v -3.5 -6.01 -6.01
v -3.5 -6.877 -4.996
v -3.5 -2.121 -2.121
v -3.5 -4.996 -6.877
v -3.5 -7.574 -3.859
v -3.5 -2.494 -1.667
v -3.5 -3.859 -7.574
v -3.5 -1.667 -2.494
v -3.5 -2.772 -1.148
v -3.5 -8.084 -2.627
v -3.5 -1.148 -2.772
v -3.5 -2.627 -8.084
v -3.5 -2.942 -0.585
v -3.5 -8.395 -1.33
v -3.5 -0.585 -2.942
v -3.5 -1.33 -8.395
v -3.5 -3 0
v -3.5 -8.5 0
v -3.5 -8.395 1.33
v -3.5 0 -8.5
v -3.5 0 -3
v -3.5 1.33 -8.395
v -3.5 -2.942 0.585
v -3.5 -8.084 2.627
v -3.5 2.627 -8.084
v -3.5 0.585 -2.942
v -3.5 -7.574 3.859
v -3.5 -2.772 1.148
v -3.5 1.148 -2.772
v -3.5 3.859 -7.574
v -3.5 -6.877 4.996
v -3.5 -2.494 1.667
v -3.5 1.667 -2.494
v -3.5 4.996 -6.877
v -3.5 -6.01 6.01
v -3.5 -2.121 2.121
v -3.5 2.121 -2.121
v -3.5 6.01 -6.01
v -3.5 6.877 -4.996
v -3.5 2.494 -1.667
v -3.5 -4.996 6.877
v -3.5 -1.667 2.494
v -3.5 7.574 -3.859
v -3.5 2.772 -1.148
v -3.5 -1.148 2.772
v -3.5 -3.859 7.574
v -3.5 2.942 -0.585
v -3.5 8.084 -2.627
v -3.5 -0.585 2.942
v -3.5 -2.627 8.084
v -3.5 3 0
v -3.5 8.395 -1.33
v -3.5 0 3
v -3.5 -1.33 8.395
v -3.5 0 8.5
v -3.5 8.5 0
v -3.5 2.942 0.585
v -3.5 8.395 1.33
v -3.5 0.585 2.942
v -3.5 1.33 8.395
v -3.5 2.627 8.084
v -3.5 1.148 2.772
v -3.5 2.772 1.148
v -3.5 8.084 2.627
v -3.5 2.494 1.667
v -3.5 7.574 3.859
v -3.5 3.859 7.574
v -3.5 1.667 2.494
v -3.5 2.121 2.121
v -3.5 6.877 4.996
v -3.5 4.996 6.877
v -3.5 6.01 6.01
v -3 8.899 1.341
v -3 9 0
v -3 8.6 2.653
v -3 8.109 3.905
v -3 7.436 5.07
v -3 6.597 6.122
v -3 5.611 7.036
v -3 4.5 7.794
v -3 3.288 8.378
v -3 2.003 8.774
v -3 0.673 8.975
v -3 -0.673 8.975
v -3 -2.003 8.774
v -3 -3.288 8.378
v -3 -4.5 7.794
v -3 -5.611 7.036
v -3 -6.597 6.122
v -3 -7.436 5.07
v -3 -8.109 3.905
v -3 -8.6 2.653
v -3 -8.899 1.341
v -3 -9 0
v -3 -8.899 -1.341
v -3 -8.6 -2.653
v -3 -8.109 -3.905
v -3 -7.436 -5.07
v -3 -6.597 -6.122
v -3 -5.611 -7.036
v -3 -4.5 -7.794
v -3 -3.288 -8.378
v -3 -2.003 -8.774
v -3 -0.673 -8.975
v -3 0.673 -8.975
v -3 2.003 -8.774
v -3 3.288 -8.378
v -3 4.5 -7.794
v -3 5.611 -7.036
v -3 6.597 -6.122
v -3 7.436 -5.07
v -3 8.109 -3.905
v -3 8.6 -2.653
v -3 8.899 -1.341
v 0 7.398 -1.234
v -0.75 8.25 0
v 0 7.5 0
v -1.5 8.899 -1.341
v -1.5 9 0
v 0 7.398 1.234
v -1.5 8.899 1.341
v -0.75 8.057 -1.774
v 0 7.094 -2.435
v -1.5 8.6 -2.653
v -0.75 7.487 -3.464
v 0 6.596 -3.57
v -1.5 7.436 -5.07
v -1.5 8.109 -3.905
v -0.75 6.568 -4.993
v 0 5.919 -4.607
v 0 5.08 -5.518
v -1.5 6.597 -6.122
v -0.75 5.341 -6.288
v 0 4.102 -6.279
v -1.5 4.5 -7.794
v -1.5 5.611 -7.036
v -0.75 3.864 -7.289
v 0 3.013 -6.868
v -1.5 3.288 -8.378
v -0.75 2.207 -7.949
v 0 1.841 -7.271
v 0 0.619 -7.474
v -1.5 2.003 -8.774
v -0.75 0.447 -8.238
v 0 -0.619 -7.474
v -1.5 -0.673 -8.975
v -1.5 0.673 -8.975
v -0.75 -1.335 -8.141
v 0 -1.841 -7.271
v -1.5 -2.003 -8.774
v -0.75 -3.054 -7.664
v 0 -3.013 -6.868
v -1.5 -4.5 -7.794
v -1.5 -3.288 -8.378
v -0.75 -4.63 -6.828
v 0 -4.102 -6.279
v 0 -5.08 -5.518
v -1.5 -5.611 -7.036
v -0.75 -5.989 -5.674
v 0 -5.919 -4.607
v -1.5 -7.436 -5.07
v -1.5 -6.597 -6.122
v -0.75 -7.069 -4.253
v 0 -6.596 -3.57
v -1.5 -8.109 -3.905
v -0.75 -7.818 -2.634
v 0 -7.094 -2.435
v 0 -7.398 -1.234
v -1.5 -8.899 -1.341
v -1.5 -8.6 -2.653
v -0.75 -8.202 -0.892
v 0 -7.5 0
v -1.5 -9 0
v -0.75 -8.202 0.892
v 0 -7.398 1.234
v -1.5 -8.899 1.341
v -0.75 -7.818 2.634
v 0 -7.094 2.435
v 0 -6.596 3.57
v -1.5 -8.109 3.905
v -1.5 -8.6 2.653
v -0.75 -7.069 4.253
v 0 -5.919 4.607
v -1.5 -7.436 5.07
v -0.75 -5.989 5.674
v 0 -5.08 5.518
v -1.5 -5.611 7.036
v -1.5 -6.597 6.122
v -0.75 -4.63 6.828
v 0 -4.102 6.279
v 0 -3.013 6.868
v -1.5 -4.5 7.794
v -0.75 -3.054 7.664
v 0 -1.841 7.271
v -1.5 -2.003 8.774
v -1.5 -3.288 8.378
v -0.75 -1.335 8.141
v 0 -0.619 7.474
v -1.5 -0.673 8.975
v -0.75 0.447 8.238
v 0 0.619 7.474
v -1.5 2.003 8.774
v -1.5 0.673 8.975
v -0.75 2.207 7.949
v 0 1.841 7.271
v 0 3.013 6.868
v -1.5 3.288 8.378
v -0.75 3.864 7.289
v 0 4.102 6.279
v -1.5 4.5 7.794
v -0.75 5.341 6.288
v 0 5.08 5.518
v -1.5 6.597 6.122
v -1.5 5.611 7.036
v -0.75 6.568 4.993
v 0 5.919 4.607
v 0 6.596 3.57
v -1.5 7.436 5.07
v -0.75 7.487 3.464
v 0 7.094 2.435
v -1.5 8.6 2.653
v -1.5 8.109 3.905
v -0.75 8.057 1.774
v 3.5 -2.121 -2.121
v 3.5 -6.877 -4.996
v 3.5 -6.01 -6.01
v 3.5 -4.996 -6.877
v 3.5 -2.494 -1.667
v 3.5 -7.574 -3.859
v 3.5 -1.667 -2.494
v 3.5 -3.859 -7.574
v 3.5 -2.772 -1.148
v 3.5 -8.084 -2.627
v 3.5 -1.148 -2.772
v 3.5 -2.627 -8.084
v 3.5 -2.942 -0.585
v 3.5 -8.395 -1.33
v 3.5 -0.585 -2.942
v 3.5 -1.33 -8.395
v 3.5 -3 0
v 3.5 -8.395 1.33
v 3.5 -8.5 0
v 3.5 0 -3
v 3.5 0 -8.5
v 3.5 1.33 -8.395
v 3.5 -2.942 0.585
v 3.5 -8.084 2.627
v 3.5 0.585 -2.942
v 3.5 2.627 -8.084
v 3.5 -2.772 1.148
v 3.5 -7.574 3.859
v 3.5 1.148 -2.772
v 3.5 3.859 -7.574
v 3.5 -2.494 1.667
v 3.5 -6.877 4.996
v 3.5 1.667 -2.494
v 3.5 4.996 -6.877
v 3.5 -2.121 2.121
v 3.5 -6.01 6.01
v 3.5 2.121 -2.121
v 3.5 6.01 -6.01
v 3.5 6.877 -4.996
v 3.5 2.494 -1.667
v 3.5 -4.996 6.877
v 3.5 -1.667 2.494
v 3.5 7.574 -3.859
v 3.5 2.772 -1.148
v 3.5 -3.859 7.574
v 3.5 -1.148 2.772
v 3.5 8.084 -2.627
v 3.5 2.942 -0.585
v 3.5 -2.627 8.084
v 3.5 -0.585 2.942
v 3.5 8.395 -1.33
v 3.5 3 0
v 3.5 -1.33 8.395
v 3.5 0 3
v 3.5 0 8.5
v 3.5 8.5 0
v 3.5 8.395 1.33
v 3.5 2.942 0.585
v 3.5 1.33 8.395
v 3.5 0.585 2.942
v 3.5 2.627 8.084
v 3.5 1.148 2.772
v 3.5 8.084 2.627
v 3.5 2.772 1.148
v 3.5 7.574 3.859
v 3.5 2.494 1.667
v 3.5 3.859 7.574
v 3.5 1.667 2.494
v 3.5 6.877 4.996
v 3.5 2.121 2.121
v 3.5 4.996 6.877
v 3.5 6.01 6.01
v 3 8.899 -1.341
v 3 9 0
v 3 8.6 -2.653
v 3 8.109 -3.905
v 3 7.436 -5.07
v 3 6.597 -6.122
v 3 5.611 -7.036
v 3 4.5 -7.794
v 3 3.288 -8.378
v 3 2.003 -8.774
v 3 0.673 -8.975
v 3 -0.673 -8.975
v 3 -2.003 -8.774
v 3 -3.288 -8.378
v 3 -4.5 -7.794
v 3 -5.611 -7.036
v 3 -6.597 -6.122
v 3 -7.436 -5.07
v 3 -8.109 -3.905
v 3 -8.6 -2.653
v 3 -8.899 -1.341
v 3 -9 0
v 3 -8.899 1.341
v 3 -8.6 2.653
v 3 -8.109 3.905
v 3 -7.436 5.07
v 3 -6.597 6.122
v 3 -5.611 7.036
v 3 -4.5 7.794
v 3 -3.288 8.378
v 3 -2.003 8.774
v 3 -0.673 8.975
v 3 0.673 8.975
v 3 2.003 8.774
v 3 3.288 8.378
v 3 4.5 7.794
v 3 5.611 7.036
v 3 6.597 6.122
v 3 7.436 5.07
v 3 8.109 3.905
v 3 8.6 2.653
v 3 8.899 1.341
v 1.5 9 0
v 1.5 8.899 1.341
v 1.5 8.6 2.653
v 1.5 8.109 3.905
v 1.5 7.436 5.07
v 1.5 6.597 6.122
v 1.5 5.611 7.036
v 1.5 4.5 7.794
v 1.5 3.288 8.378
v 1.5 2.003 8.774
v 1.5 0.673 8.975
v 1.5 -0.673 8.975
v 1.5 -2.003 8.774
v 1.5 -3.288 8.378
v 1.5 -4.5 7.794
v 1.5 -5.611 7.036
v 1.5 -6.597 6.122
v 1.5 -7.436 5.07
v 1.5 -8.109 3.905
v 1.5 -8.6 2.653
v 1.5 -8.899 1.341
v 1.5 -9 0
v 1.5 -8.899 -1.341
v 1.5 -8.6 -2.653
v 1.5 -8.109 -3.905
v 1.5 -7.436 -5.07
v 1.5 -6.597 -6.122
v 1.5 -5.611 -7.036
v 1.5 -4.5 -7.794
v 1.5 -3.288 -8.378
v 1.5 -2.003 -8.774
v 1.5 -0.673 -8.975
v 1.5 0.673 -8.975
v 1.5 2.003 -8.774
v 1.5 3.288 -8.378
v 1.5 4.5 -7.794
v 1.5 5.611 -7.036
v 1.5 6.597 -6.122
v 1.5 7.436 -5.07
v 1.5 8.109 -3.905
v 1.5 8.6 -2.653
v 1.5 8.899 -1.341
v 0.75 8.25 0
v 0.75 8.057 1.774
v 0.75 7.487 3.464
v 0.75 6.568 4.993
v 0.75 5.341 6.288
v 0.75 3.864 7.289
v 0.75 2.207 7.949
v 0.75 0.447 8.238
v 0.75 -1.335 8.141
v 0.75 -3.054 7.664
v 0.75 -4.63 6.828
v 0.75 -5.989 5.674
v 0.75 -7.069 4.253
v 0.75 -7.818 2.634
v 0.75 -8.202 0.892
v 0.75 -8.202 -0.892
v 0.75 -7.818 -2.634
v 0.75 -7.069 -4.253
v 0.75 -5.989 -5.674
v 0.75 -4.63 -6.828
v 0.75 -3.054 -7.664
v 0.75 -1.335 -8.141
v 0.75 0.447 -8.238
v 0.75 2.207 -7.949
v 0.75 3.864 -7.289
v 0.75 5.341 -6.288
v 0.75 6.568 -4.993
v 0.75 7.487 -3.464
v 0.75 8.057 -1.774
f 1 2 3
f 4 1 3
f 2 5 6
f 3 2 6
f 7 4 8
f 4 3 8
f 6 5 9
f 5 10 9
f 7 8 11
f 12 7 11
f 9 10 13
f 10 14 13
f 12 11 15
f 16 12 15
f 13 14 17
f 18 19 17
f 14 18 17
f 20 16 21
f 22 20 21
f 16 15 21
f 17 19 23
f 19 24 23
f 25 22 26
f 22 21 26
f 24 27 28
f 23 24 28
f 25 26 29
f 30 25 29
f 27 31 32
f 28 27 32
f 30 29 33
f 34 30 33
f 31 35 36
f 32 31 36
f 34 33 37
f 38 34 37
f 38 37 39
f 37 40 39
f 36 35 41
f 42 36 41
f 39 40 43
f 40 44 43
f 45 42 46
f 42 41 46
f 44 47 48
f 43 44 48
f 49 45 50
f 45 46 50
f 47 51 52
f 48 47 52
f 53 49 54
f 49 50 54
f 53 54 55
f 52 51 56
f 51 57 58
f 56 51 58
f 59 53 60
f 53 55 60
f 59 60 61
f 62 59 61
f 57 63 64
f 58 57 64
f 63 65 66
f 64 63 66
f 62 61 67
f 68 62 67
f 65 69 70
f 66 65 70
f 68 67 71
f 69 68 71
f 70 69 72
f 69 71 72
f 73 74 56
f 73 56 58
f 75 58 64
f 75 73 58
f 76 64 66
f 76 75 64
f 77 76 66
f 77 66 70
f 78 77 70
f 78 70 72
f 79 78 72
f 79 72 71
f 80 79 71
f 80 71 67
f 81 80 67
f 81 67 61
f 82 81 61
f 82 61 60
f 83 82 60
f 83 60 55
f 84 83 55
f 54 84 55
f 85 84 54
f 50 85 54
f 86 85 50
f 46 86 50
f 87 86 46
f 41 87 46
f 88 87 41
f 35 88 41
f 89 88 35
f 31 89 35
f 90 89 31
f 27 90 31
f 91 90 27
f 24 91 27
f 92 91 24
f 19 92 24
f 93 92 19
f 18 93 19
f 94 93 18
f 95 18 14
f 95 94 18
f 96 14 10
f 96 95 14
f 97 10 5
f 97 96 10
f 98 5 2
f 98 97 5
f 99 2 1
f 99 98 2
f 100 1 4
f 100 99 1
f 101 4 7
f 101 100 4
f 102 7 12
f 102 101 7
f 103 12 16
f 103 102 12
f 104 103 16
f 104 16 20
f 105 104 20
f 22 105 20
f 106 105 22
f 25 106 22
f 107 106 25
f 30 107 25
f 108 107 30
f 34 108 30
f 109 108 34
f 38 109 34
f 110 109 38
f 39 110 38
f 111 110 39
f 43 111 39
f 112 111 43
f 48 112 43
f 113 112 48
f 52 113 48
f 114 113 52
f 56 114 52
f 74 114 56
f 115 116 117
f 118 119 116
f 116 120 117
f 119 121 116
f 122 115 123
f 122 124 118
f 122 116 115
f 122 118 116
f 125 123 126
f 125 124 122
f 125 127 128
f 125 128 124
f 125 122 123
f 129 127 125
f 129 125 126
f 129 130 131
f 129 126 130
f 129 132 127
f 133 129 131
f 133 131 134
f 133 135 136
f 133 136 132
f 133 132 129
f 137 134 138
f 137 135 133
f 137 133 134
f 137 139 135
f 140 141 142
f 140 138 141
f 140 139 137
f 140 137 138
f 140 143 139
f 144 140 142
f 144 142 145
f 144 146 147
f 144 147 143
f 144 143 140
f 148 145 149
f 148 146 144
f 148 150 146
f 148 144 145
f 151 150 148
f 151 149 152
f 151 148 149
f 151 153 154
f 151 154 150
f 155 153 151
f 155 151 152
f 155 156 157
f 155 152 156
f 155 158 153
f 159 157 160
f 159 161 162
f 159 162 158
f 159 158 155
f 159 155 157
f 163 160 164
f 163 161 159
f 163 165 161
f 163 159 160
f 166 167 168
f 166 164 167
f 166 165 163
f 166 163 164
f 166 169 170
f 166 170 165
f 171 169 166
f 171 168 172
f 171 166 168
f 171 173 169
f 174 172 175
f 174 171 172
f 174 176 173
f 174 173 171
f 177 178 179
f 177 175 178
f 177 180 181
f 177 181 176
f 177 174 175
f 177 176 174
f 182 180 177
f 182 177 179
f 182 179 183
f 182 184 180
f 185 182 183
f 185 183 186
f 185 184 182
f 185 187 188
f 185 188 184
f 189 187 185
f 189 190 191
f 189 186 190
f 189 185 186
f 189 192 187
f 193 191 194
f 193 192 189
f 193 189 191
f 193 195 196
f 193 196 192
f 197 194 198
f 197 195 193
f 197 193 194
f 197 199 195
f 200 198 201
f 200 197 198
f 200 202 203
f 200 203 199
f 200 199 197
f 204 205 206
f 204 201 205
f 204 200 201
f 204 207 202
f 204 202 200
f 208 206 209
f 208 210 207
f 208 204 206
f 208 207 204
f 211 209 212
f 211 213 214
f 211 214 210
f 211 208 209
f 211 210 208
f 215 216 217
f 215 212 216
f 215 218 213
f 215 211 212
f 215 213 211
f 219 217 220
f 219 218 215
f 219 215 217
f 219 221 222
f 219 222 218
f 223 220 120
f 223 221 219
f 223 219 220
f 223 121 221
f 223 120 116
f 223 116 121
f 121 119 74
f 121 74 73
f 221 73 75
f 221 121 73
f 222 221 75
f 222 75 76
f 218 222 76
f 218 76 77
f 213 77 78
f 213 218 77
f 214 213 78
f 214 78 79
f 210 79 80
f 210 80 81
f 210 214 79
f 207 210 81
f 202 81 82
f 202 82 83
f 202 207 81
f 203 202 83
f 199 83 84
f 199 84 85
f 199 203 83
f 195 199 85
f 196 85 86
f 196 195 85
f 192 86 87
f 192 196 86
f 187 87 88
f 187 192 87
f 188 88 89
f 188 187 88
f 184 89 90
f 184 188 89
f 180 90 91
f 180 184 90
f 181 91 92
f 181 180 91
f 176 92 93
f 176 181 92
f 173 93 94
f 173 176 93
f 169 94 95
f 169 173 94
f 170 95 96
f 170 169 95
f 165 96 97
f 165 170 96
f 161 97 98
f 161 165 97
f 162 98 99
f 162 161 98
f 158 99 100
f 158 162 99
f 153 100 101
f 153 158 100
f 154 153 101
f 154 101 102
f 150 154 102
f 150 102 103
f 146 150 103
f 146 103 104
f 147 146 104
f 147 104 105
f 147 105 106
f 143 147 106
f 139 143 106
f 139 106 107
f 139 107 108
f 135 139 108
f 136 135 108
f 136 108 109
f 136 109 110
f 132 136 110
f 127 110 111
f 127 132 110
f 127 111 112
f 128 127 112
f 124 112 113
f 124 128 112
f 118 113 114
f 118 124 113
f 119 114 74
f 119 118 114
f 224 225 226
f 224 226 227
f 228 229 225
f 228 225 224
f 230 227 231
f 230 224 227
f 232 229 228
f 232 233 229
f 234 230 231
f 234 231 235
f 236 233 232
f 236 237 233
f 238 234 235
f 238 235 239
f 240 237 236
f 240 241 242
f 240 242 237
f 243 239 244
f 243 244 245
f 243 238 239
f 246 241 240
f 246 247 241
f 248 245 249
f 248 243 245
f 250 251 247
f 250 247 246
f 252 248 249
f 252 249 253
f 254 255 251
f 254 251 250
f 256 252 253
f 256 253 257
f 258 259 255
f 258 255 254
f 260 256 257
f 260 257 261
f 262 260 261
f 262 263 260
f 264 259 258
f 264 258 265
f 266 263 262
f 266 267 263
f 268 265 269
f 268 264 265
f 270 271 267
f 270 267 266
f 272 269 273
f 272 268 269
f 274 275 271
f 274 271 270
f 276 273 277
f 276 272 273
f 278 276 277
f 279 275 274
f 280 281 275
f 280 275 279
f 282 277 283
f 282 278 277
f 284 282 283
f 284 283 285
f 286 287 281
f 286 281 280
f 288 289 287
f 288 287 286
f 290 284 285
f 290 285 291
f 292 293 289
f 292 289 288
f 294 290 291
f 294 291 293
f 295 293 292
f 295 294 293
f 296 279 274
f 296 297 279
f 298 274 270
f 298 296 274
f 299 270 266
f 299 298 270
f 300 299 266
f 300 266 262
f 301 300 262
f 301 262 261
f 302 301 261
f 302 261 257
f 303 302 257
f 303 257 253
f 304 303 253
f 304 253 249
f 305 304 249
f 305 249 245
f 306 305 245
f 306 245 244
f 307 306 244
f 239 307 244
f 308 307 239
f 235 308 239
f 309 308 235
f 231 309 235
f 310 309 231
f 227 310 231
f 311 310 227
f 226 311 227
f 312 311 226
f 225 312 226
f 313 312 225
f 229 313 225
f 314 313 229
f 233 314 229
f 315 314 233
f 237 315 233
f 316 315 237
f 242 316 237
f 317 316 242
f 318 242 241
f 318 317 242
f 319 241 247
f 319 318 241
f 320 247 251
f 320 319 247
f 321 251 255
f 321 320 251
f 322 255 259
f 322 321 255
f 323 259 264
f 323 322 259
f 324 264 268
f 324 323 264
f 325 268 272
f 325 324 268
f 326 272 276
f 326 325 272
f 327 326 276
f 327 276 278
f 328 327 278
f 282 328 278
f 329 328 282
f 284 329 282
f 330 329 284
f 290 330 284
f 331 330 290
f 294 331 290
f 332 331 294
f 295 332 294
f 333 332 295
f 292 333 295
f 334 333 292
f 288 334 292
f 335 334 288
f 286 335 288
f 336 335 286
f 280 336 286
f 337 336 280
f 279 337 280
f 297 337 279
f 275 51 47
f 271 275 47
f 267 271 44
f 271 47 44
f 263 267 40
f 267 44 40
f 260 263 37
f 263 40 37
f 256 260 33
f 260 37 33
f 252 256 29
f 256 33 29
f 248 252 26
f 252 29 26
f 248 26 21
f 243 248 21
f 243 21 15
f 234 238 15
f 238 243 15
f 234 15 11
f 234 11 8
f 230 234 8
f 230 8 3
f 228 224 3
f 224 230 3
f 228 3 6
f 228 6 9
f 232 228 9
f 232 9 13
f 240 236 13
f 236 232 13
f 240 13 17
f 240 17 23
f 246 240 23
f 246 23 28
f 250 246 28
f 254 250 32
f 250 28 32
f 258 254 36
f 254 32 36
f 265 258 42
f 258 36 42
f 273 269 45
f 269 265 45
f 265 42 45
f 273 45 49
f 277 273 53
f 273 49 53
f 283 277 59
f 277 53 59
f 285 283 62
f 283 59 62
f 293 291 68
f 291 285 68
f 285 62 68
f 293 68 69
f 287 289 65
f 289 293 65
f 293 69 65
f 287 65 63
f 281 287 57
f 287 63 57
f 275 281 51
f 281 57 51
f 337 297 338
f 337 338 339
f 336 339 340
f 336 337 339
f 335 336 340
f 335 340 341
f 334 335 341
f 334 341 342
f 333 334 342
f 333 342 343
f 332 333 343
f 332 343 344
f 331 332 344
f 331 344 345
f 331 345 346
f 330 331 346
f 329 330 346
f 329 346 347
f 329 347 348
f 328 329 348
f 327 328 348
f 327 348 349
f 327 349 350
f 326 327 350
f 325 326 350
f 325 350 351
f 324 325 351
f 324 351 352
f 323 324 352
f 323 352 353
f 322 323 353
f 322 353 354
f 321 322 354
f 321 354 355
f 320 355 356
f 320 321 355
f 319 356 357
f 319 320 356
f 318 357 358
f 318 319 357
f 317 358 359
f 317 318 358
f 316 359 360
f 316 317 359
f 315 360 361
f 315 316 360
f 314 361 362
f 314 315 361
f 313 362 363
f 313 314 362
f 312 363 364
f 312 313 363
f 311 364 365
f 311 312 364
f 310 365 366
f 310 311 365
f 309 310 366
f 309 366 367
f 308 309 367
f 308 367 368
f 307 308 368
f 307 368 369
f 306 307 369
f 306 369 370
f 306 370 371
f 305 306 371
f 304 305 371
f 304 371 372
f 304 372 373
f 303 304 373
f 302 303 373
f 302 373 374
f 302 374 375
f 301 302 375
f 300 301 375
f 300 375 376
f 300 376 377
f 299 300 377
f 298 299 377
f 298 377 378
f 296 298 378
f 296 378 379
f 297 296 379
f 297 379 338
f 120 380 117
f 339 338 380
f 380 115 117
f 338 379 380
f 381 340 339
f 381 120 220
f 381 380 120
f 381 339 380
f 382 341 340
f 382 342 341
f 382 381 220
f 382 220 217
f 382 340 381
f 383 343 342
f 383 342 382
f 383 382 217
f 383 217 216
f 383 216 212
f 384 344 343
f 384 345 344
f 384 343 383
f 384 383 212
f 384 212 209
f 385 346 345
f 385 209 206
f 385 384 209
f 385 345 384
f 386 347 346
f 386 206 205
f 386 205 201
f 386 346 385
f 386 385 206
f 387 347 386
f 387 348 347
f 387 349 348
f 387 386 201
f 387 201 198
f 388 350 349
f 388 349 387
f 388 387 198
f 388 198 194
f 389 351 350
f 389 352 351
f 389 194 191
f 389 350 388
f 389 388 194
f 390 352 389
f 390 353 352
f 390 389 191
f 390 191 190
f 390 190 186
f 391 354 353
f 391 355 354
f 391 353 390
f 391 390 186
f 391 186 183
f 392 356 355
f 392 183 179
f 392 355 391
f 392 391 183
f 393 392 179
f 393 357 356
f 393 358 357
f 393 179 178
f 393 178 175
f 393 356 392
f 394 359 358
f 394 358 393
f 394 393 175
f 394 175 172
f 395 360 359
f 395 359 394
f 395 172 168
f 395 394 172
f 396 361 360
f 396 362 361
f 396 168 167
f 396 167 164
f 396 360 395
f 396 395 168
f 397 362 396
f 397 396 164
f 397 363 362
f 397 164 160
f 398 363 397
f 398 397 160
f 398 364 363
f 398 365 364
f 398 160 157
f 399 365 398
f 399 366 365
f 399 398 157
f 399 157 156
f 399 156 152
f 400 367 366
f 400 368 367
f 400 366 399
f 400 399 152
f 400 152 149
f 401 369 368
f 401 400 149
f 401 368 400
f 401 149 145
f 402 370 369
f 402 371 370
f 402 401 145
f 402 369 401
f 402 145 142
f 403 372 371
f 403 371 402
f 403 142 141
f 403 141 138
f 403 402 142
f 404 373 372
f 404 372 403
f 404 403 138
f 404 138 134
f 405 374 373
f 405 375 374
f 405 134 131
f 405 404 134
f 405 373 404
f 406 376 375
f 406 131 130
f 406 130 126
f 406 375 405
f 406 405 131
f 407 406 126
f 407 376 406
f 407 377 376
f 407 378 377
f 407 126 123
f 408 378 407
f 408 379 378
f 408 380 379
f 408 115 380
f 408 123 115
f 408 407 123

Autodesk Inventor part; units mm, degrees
ref_plane "YZ Plane" through (0, 0, 0) normal (1, 0, 0) x (0, 1, 0)
ref_plane "XZ Plane" through (0, 0, 0) normal (0, 1, 0) x (-1, 0, 0)
ref_plane "XY Plane" through (0, 0, 0) normal (0, 0, 1) x (1, 0, 0)
sketch "Skizze1" plane through (0, 0, 0) normal (0, 0, 1) x (1, 0, 0)
  line L0 (-4.9, 0) -> (4.9, 0) projected
  line L1 (0, -1.8) -> (0, 10.8) projected
  line L2 (3.5, 9) -> (3.5, 3)
  line L3 (3.5, 3) -> (-3.5, 3)
  line L4 (-3.5, 3) -> (-3.5, 9)
  line L5 (-1.5, 9) -> (0, 7.5)
  line L6 (0, 7.5) -> (1.5, 9)
  line L7 (-3.5, 9) -> (-1.5, 9)
  line L8 (1.5, 9) -> (3.5, 9)
  circle A0 centre (0, 7.8536) radius 0.25
  point P0 (0, 0)
  dimension "d0" = 6
  dimension "d1" = 18
  dimension "d2" = 7
  dimension "d3" = 90
  dimension "d4" = 15
  dimension "d9" = 0.5
  dimension "d10" = 15.7071
revolve "Umdrehung1" add sketch "Skizze1" angle 360 about axis through (-10, 0, 0) along (1, 0, 0) contours L3 L4 L7 L5 L1 | L1 L6 L8 L2 L3
chamfer "Fase1" distance 0.5 angle 45 2 edges at (-3.5, -9, 0) (3.5, -9, 0)
properties part number "13_0204_044"
